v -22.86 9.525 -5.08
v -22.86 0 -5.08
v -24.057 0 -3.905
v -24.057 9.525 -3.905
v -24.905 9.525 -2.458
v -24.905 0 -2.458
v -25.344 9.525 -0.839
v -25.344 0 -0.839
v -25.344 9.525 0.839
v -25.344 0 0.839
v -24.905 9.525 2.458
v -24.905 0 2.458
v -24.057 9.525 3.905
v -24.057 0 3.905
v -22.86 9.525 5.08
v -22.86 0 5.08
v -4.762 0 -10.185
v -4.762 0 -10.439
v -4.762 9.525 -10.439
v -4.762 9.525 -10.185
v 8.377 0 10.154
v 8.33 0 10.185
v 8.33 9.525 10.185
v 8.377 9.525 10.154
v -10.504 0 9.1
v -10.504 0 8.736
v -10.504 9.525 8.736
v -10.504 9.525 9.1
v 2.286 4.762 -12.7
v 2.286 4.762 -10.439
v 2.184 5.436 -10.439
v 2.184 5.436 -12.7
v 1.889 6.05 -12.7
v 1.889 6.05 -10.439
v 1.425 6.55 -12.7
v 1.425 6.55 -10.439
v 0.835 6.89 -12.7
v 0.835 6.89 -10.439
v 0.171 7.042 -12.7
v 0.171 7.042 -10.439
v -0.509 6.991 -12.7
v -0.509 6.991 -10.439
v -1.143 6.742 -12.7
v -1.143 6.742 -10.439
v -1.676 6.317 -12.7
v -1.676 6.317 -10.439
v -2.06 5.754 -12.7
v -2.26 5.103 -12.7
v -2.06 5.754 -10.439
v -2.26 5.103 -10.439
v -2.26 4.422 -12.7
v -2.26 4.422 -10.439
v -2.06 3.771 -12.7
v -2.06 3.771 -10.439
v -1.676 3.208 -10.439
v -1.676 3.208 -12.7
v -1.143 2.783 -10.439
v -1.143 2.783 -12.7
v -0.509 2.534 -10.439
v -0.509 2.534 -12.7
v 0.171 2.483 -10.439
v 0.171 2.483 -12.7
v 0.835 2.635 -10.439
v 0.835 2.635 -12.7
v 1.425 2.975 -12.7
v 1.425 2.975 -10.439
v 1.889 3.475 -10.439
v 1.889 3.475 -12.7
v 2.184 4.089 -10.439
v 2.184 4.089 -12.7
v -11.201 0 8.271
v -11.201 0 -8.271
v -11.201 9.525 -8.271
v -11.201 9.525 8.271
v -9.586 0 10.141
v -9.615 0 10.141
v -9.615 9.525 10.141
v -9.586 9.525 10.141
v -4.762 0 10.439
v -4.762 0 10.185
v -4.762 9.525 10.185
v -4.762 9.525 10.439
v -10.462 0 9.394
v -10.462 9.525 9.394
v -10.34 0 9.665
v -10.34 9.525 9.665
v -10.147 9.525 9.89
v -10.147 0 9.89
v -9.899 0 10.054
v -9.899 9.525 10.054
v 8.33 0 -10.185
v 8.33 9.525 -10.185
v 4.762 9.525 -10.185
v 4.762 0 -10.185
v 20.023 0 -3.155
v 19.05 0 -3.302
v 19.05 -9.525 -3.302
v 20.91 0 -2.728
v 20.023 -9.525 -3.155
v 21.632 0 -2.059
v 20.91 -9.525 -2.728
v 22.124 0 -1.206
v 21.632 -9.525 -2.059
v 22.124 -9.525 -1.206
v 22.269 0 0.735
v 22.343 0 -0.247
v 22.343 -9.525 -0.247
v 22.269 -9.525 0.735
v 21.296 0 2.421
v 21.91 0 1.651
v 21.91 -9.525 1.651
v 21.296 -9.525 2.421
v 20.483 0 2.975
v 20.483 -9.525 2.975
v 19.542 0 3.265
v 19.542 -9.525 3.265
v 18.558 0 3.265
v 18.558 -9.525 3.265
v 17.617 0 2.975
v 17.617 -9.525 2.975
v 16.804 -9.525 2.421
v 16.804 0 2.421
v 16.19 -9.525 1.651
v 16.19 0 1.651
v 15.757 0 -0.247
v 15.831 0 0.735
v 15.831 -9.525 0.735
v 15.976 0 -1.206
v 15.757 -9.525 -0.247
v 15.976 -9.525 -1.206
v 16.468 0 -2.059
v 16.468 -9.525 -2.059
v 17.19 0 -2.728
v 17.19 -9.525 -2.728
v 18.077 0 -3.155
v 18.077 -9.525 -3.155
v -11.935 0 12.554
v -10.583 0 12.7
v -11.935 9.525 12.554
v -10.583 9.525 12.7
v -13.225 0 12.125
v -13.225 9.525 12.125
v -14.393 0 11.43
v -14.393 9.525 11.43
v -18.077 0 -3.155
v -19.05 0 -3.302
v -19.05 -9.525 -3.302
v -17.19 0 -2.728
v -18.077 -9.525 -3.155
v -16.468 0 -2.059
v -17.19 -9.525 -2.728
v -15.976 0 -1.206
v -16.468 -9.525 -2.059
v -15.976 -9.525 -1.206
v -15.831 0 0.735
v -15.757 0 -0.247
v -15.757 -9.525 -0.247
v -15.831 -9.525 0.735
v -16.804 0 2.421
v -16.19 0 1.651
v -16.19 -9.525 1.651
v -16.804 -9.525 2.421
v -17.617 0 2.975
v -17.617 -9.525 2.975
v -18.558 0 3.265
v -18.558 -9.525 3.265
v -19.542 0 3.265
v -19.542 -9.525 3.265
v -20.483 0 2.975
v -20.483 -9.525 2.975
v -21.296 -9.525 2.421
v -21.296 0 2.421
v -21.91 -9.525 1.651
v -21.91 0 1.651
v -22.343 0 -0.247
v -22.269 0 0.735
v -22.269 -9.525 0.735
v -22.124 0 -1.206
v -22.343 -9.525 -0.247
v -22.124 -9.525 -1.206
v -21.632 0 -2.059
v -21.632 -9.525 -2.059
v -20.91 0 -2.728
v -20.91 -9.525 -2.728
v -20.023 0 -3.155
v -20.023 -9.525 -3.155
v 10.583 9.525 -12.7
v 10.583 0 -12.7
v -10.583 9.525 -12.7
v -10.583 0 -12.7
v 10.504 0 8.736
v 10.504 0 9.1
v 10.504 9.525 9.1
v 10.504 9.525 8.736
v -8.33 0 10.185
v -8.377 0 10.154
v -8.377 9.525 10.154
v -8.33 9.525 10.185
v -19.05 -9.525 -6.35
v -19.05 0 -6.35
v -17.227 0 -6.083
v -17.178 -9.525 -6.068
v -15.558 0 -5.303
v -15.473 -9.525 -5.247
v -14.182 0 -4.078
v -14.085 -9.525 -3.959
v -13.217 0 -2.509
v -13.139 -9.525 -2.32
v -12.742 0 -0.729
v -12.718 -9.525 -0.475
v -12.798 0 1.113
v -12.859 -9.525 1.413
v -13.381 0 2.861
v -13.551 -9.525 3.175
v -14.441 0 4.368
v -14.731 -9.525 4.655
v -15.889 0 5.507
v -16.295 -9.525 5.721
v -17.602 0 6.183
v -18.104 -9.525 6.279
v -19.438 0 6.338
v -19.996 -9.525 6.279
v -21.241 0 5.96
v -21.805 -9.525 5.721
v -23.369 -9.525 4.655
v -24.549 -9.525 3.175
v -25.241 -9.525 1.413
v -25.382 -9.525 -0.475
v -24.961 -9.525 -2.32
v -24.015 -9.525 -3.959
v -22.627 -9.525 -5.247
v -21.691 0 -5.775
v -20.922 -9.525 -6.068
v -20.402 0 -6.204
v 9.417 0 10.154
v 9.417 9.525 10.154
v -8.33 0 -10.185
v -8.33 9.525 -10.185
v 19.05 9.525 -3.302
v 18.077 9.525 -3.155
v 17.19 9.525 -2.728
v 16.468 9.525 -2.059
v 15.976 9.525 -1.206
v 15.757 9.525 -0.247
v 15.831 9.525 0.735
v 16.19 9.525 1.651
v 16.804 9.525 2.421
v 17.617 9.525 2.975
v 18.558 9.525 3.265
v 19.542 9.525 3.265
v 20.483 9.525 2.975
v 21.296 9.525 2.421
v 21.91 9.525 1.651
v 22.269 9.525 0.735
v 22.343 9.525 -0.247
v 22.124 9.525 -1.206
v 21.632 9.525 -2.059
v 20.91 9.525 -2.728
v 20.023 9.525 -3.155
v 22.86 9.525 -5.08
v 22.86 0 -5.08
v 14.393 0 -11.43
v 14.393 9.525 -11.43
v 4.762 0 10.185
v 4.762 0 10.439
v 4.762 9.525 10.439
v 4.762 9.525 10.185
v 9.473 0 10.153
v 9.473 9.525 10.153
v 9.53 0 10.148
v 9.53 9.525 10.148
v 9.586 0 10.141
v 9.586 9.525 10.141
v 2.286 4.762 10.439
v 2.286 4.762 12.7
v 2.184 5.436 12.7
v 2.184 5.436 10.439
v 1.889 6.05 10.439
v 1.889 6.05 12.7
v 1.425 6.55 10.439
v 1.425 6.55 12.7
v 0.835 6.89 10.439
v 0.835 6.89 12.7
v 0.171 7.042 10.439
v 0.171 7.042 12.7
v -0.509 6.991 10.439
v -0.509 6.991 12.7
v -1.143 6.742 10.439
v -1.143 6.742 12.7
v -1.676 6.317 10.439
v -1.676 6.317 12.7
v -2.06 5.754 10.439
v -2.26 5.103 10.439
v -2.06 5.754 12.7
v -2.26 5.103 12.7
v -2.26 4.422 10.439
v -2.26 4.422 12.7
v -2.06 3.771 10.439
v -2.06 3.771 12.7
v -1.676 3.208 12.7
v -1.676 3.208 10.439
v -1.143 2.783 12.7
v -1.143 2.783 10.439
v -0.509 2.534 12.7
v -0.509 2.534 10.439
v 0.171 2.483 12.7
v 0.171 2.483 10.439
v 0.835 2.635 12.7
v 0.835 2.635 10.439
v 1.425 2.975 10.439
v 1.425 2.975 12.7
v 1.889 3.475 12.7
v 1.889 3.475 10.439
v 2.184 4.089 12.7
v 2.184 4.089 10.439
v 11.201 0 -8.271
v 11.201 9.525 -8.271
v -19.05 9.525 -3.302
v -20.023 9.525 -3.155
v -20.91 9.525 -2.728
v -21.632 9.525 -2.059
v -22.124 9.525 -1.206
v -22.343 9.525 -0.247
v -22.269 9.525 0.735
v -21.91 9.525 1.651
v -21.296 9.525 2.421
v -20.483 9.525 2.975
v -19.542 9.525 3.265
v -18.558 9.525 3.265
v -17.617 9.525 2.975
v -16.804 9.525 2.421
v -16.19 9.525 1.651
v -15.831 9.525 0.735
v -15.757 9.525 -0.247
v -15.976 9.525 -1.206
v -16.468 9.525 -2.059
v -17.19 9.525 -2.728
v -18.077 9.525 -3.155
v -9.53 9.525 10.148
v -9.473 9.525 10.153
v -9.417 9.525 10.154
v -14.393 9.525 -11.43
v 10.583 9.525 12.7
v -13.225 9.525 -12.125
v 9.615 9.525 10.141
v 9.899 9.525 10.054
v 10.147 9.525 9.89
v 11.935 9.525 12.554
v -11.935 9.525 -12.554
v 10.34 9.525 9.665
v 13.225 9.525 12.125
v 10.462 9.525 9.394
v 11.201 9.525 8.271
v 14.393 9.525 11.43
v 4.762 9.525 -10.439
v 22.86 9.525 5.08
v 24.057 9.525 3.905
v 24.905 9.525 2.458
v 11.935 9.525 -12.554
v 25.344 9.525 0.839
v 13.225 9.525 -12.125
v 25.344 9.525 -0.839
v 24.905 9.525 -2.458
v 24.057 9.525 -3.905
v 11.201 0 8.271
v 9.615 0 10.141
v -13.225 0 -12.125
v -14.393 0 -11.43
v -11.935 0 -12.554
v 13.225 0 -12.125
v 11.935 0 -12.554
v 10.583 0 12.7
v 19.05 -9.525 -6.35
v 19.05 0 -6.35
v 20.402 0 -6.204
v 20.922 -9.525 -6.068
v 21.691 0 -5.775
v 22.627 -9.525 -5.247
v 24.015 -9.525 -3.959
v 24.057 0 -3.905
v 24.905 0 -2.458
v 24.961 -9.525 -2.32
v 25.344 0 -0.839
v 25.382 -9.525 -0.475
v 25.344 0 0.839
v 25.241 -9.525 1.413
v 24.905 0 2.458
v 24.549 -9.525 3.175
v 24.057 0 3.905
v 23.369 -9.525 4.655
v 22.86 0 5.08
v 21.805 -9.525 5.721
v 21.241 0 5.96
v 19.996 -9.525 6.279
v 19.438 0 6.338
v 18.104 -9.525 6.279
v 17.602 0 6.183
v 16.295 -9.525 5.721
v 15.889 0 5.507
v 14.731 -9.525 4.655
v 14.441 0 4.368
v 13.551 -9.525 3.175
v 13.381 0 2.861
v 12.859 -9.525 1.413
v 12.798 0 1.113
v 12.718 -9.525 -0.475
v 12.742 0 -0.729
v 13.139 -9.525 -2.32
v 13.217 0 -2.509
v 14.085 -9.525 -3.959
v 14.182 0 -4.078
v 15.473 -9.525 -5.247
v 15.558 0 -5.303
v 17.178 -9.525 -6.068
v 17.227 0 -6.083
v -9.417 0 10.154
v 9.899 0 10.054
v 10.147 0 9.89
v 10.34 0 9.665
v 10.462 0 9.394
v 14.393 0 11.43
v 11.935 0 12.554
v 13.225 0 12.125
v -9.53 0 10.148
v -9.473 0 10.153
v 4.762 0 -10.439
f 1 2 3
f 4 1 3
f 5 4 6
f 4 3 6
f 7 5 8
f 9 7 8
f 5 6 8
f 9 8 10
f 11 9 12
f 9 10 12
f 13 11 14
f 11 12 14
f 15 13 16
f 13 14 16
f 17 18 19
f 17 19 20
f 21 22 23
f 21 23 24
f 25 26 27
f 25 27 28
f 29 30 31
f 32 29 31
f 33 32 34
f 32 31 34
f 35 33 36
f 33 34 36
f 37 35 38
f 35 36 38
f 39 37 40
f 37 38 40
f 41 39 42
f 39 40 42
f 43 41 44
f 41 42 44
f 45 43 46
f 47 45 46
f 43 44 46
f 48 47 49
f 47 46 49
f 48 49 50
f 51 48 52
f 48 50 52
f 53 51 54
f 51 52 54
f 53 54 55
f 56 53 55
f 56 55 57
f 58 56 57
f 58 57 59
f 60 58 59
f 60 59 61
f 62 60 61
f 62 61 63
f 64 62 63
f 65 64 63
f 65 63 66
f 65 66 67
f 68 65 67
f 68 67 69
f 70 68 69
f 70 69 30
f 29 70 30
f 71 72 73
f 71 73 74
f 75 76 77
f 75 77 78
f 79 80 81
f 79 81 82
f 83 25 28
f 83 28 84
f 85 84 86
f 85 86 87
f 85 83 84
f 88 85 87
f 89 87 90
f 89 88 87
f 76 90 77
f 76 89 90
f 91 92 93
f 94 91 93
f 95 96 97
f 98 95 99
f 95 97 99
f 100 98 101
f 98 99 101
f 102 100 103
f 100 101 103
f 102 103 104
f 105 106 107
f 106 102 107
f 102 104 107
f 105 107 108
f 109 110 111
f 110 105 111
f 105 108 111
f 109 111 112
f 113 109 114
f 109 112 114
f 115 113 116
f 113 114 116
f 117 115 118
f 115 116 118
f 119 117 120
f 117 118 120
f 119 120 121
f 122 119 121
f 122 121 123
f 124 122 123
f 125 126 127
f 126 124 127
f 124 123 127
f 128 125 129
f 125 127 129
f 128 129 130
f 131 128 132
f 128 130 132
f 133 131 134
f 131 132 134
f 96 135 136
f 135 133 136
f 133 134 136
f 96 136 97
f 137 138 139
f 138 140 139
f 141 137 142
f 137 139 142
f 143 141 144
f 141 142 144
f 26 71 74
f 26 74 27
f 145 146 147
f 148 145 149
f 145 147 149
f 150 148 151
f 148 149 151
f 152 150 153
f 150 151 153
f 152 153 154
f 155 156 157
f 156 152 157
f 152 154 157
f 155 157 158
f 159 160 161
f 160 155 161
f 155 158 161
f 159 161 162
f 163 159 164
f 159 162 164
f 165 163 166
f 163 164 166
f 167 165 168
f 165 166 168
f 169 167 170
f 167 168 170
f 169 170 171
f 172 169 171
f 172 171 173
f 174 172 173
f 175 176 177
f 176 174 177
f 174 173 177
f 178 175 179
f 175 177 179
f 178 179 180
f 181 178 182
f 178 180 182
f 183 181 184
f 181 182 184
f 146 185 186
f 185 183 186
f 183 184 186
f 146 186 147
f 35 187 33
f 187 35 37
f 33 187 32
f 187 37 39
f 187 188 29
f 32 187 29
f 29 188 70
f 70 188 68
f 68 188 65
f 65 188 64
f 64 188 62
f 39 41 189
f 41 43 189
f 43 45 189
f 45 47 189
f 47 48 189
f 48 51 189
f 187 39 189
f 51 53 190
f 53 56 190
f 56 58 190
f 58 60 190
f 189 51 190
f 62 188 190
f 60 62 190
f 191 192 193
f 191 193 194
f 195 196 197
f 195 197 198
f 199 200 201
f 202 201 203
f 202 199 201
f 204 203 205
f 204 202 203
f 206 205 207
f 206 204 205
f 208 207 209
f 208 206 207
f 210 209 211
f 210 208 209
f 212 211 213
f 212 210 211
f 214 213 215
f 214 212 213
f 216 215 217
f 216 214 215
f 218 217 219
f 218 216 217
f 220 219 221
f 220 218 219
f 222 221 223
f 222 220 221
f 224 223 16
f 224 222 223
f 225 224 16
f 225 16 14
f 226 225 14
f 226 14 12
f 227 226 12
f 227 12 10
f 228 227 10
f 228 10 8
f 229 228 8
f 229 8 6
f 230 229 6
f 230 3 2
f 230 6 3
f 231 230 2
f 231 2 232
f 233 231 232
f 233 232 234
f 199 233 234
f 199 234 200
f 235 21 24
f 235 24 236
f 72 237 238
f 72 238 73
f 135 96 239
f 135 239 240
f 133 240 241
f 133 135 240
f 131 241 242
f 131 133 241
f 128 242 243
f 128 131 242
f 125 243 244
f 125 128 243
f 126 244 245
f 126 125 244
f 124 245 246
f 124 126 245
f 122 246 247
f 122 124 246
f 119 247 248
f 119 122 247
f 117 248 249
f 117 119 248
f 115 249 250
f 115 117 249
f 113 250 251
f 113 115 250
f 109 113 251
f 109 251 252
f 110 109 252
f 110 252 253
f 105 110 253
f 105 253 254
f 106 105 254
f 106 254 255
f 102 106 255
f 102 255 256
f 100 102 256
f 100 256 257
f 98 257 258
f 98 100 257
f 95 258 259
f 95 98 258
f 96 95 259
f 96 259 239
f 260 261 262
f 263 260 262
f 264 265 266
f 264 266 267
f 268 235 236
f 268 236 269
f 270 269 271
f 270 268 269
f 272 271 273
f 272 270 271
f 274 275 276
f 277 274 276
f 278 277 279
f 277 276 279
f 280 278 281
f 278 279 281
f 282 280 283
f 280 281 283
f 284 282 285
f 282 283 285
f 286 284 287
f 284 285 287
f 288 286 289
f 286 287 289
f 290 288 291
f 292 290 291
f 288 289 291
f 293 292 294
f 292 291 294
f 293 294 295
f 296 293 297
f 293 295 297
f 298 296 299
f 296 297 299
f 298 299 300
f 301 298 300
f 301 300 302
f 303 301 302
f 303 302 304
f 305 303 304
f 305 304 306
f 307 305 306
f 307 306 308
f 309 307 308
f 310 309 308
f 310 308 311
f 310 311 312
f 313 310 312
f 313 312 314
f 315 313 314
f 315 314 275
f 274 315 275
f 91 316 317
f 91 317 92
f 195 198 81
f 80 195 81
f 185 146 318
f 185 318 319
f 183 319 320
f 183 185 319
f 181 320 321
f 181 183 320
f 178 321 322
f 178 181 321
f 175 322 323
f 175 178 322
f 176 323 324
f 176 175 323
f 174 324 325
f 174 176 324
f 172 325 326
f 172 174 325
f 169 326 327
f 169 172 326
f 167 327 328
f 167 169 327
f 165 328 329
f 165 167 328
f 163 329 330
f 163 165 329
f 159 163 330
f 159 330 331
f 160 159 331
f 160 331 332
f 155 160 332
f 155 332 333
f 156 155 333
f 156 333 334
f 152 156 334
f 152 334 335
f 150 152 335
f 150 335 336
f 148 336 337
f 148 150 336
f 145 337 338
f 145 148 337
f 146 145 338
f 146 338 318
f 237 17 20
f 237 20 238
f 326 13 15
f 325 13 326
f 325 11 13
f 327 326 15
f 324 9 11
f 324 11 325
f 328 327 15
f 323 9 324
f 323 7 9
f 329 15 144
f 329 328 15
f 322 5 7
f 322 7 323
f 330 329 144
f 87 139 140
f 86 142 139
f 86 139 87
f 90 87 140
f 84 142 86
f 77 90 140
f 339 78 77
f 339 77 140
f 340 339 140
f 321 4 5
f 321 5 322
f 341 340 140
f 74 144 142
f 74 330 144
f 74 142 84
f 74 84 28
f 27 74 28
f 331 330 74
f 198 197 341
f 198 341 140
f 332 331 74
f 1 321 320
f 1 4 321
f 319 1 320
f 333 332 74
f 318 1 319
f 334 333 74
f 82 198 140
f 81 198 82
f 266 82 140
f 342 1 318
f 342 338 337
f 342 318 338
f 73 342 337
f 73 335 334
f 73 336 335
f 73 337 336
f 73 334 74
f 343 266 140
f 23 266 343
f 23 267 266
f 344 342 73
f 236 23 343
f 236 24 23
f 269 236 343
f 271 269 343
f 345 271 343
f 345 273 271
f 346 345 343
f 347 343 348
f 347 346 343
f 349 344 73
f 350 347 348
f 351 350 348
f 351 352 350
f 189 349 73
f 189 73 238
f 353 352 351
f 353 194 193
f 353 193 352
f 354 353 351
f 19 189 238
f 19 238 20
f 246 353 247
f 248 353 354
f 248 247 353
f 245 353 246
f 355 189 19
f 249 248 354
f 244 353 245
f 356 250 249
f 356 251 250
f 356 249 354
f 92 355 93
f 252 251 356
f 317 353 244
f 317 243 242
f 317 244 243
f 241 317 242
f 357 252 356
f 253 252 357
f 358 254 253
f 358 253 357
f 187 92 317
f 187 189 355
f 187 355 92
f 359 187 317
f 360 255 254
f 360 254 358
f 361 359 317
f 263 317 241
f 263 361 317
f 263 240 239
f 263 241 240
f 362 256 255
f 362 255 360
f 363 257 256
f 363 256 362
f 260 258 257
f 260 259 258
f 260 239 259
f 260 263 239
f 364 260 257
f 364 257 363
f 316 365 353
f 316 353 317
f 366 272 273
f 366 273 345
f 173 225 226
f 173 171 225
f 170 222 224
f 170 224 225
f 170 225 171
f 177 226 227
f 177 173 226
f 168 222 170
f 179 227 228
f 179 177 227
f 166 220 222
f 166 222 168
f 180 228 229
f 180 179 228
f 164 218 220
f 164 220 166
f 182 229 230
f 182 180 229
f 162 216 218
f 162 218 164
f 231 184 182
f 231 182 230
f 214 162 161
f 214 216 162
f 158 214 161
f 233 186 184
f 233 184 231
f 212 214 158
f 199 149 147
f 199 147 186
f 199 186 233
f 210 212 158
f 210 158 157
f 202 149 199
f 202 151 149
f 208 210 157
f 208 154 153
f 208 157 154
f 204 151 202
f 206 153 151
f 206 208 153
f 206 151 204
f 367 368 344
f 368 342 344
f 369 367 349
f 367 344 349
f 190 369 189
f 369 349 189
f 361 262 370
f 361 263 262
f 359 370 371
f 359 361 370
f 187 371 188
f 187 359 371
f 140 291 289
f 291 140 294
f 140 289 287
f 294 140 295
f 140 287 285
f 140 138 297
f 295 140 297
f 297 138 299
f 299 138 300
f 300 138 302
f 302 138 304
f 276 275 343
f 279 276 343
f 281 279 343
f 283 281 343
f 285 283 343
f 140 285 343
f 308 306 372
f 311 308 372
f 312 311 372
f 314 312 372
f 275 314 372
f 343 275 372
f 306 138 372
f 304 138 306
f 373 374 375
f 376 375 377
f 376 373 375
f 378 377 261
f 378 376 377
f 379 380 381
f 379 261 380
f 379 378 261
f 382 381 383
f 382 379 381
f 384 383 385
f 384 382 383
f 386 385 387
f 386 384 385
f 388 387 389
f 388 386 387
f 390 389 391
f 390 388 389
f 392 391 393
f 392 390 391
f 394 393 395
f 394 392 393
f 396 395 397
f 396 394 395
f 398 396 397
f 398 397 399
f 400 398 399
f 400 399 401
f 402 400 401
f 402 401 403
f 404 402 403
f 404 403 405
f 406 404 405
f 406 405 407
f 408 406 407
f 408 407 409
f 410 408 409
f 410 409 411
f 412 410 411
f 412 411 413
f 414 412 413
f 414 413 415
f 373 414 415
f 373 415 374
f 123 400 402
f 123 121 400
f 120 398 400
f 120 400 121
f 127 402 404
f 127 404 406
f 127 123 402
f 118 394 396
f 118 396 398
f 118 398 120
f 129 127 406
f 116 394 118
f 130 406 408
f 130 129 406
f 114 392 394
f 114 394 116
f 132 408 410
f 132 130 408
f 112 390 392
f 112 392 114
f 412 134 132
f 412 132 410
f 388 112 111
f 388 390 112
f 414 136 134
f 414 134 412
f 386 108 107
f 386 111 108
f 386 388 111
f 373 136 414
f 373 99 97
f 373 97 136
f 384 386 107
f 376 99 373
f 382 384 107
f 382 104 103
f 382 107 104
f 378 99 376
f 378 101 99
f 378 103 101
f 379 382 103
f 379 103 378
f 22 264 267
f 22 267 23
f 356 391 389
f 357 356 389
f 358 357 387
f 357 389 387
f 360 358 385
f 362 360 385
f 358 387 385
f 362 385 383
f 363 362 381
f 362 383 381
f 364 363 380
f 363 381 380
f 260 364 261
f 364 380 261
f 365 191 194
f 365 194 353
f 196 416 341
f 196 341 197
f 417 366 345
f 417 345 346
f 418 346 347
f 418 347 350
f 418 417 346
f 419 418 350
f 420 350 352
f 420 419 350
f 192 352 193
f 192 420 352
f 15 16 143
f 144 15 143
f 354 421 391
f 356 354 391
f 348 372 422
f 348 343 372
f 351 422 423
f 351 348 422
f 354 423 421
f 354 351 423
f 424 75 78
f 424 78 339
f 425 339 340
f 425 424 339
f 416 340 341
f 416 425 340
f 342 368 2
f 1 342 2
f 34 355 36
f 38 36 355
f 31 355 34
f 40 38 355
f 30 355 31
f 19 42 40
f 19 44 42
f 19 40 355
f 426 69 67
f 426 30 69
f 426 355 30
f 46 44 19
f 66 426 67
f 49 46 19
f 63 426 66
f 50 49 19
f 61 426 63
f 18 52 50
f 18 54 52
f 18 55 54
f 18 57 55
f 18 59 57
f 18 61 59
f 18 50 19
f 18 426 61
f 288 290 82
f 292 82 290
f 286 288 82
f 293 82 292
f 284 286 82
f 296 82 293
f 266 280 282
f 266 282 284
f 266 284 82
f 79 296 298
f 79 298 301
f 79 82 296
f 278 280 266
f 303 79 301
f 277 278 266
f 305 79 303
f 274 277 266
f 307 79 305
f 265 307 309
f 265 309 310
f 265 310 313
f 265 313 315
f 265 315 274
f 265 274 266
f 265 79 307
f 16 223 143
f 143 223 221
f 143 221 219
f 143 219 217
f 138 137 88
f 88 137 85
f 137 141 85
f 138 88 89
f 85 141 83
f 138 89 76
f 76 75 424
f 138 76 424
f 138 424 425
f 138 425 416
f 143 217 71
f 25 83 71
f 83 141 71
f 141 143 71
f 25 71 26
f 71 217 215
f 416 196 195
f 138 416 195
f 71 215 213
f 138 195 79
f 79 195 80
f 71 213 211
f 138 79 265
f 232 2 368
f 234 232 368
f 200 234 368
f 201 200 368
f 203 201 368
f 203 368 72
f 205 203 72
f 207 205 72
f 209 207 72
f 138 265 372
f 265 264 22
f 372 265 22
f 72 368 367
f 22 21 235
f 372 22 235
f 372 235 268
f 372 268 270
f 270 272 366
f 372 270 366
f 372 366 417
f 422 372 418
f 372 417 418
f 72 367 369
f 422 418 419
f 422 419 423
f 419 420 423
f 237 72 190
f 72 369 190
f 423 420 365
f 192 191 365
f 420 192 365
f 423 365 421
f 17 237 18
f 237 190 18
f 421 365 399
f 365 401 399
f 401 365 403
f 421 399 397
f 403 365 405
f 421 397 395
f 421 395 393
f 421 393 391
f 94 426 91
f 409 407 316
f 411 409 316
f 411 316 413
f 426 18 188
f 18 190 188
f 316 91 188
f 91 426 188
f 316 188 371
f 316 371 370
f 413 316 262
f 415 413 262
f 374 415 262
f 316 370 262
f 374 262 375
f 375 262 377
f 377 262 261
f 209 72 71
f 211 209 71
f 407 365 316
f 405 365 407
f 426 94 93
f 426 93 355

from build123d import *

# Parameters (mm, degrees)
SKETCH1_R           = 3.302
BOSS_EXTRUDE1_DEPTH = 9.525
FILLET1_R           = 6.35
SKETCH2_R           = 2.286
CUT_EXTRUDE1_DEPTH  = 38.162422217
BOSS_EXTRUDE2_START = 9.525
SKETCH3_R           = 6.35
SKETCH3_R_2         = 3.302
BOSS_EXTRUDE2_DEPTH = 9.525


with BuildPart() as part:
    # Sketch1 → Boss-Extrude1 (new body)
    with BuildSketch(Plane(origin=(0, 0, 0), x_dir=(1, 0, 0), z_dir=(0, 1, 0))):
        with BuildLine():
            Line((-12.7, -12.7), (12.7, -12.7))
            Line((12.7, -12.7), (22.86, -5.08))
            ThreePointArc((22.86, -5.08), (25.4, 0), (22.86, 5.08))
            Line((22.86, 5.08), (12.7, 12.7))
            Line((12.7, 12.7), (-12.7, 12.7))
            Line((-12.7, 12.7), (-22.86, 5.08))
            ThreePointArc((-22.86, 5.08), (-25.4, 0), (-22.86, -5.08))
            Line((-22.86, -5.08), (-12.7, -12.7))
        make_face()
        with Locations(Location((-19.05, 0, 0), (0, 0, 90))):
            Circle(SKETCH1_R, mode=Mode.SUBTRACT)
        with Locations(Location((19.05, 0, 0), (0, 0, 90))):
            Circle(SKETCH1_R, mode=Mode.SUBTRACT)
        with BuildLine():
            Line((4.7625, -10.1854), (8.329805012, -10.1854))
            Line((8.329805012, -10.1854), (8.376905012, -10.154))
            Line((8.376905012, -10.154), (9.416515139, -10.154))
            ThreePointArc((9.416515139, -10.154), (9.501675056, -10.1507417), (9.586332782, -10.140948982))
            Line((9.586332782, -10.140948982), (9.615351798, -10.140948982))
            ThreePointArc((9.615351798, -10.140948982), (10.251622353, -9.784337345), (10.504, -9.1))
            Line((10.504, -9.1), (10.504, -8.735936675))
            Line((10.504, -8.735936675), (11.2014, -8.271003341))
            Line((11.2014, -8.271003341), (11.2014, 8.271003341))
            Line((11.2014, 8.271003341), (8.329805012, 10.1854))
            Line((8.329805012, 10.1854), (4.7625, 10.1854))
            Line((4.7625, 10.1854), (4.7625, 10.4394))
            Line((4.7625, 10.4394), (-4.7625, 10.4394))
            Line((-4.7625, 10.4394), (-4.7625, 10.1854))
            Line((-4.7625, 10.1854), (-8.329805012, 10.1854))
            Line((-8.329805012, 10.1854), (-11.2014, 8.271003341))
            Line((-11.2014, 8.271003341), (-11.2014, -8.271003341))
            Line((-11.2014, -8.271003341), (-10.504, -8.735936675))
            Line((-10.504, -8.735936675), (-10.504, -9.1))
            ThreePointArc((-10.504, -9.1), (-10.251622353, -9.784337345), (-9.615351798, -10.140948982))
            Line((-9.615351798, -10.140948982), (-9.586332782, -10.140948982))
            ThreePointArc((-9.586332782, -10.140948982), (-9.501675056, -10.1507417), (-9.416515139, -10.154))
            Line((-9.416515139, -10.154), (-8.376905012, -10.154))
            Line((-8.376905012, -10.154), (-8.329805012, -10.1854))
            Line((-8.329805012, -10.1854), (-4.7625, -10.1854))
            Line((-4.7625, -10.1854), (-4.7625, -10.4394))
            Line((-4.7625, -10.4394), (4.7625, -10.4394))
            Line((4.7625, -10.4394), (4.7625, -10.1854))
        make_face(mode=Mode.SUBTRACT)
    extrude(amount=BOSS_EXTRUDE1_DEPTH)

    # Fillet1
    fillet1_edges = [part.edges().sort_by_distance(p)[0] for p in [
        (12.7, 4.7625, -12.7),
        (12.7, 4.7625, 12.7),
        (-12.7, 4.7625, 12.7),
        (-12.7, 4.7625, -12.7),
    ]]
    fillet(fillet1_edges, radius=FILLET1_R)

    # Sketch2 → Cut-Extrude1 (cut, through all)
    with BuildSketch(Plane.XY.offset(12.7)):
        with Locations((0, 4.7625)):
            Circle(SKETCH2_R)
    extrude(amount=-CUT_EXTRUDE1_DEPTH, mode=Mode.SUBTRACT)

    # Sketch3 → Boss-Extrude2 (add)
    # profile 1 of 2: a face of its own
    with BuildSketch(Plane(origin=(0, 0, 0), x_dir=(-1, 0, 0), z_dir=(0, -1, 0)).offset(BOSS_EXTRUDE2_START)):
        with Locations(Location((19.05, 0, 0), (0, 0, 90))):
            Circle(SKETCH3_R)
        with Locations(Location((19.05, 0, 0), (0, 0, 90))):
            Circle(SKETCH3_R_2, mode=Mode.SUBTRACT)
    # profile 2 of 2: a face of its own
    with BuildSketch(Plane(origin=(0, 0, 0), x_dir=(-1, 0, 0), z_dir=(0, -1, 0)).offset(BOSS_EXTRUDE2_START)):
        with Locations(Location((-19.05, 0, 0), (0, 0, 90))):
            Circle(SKETCH3_R)
        with Locations(Location((-19.05, 0, 0), (0, 0, 90))):
            Circle(SKETCH3_R_2, mode=Mode.SUBTRACT)
    extrude(amount=-BOSS_EXTRUDE2_DEPTH)


solid = part.part
